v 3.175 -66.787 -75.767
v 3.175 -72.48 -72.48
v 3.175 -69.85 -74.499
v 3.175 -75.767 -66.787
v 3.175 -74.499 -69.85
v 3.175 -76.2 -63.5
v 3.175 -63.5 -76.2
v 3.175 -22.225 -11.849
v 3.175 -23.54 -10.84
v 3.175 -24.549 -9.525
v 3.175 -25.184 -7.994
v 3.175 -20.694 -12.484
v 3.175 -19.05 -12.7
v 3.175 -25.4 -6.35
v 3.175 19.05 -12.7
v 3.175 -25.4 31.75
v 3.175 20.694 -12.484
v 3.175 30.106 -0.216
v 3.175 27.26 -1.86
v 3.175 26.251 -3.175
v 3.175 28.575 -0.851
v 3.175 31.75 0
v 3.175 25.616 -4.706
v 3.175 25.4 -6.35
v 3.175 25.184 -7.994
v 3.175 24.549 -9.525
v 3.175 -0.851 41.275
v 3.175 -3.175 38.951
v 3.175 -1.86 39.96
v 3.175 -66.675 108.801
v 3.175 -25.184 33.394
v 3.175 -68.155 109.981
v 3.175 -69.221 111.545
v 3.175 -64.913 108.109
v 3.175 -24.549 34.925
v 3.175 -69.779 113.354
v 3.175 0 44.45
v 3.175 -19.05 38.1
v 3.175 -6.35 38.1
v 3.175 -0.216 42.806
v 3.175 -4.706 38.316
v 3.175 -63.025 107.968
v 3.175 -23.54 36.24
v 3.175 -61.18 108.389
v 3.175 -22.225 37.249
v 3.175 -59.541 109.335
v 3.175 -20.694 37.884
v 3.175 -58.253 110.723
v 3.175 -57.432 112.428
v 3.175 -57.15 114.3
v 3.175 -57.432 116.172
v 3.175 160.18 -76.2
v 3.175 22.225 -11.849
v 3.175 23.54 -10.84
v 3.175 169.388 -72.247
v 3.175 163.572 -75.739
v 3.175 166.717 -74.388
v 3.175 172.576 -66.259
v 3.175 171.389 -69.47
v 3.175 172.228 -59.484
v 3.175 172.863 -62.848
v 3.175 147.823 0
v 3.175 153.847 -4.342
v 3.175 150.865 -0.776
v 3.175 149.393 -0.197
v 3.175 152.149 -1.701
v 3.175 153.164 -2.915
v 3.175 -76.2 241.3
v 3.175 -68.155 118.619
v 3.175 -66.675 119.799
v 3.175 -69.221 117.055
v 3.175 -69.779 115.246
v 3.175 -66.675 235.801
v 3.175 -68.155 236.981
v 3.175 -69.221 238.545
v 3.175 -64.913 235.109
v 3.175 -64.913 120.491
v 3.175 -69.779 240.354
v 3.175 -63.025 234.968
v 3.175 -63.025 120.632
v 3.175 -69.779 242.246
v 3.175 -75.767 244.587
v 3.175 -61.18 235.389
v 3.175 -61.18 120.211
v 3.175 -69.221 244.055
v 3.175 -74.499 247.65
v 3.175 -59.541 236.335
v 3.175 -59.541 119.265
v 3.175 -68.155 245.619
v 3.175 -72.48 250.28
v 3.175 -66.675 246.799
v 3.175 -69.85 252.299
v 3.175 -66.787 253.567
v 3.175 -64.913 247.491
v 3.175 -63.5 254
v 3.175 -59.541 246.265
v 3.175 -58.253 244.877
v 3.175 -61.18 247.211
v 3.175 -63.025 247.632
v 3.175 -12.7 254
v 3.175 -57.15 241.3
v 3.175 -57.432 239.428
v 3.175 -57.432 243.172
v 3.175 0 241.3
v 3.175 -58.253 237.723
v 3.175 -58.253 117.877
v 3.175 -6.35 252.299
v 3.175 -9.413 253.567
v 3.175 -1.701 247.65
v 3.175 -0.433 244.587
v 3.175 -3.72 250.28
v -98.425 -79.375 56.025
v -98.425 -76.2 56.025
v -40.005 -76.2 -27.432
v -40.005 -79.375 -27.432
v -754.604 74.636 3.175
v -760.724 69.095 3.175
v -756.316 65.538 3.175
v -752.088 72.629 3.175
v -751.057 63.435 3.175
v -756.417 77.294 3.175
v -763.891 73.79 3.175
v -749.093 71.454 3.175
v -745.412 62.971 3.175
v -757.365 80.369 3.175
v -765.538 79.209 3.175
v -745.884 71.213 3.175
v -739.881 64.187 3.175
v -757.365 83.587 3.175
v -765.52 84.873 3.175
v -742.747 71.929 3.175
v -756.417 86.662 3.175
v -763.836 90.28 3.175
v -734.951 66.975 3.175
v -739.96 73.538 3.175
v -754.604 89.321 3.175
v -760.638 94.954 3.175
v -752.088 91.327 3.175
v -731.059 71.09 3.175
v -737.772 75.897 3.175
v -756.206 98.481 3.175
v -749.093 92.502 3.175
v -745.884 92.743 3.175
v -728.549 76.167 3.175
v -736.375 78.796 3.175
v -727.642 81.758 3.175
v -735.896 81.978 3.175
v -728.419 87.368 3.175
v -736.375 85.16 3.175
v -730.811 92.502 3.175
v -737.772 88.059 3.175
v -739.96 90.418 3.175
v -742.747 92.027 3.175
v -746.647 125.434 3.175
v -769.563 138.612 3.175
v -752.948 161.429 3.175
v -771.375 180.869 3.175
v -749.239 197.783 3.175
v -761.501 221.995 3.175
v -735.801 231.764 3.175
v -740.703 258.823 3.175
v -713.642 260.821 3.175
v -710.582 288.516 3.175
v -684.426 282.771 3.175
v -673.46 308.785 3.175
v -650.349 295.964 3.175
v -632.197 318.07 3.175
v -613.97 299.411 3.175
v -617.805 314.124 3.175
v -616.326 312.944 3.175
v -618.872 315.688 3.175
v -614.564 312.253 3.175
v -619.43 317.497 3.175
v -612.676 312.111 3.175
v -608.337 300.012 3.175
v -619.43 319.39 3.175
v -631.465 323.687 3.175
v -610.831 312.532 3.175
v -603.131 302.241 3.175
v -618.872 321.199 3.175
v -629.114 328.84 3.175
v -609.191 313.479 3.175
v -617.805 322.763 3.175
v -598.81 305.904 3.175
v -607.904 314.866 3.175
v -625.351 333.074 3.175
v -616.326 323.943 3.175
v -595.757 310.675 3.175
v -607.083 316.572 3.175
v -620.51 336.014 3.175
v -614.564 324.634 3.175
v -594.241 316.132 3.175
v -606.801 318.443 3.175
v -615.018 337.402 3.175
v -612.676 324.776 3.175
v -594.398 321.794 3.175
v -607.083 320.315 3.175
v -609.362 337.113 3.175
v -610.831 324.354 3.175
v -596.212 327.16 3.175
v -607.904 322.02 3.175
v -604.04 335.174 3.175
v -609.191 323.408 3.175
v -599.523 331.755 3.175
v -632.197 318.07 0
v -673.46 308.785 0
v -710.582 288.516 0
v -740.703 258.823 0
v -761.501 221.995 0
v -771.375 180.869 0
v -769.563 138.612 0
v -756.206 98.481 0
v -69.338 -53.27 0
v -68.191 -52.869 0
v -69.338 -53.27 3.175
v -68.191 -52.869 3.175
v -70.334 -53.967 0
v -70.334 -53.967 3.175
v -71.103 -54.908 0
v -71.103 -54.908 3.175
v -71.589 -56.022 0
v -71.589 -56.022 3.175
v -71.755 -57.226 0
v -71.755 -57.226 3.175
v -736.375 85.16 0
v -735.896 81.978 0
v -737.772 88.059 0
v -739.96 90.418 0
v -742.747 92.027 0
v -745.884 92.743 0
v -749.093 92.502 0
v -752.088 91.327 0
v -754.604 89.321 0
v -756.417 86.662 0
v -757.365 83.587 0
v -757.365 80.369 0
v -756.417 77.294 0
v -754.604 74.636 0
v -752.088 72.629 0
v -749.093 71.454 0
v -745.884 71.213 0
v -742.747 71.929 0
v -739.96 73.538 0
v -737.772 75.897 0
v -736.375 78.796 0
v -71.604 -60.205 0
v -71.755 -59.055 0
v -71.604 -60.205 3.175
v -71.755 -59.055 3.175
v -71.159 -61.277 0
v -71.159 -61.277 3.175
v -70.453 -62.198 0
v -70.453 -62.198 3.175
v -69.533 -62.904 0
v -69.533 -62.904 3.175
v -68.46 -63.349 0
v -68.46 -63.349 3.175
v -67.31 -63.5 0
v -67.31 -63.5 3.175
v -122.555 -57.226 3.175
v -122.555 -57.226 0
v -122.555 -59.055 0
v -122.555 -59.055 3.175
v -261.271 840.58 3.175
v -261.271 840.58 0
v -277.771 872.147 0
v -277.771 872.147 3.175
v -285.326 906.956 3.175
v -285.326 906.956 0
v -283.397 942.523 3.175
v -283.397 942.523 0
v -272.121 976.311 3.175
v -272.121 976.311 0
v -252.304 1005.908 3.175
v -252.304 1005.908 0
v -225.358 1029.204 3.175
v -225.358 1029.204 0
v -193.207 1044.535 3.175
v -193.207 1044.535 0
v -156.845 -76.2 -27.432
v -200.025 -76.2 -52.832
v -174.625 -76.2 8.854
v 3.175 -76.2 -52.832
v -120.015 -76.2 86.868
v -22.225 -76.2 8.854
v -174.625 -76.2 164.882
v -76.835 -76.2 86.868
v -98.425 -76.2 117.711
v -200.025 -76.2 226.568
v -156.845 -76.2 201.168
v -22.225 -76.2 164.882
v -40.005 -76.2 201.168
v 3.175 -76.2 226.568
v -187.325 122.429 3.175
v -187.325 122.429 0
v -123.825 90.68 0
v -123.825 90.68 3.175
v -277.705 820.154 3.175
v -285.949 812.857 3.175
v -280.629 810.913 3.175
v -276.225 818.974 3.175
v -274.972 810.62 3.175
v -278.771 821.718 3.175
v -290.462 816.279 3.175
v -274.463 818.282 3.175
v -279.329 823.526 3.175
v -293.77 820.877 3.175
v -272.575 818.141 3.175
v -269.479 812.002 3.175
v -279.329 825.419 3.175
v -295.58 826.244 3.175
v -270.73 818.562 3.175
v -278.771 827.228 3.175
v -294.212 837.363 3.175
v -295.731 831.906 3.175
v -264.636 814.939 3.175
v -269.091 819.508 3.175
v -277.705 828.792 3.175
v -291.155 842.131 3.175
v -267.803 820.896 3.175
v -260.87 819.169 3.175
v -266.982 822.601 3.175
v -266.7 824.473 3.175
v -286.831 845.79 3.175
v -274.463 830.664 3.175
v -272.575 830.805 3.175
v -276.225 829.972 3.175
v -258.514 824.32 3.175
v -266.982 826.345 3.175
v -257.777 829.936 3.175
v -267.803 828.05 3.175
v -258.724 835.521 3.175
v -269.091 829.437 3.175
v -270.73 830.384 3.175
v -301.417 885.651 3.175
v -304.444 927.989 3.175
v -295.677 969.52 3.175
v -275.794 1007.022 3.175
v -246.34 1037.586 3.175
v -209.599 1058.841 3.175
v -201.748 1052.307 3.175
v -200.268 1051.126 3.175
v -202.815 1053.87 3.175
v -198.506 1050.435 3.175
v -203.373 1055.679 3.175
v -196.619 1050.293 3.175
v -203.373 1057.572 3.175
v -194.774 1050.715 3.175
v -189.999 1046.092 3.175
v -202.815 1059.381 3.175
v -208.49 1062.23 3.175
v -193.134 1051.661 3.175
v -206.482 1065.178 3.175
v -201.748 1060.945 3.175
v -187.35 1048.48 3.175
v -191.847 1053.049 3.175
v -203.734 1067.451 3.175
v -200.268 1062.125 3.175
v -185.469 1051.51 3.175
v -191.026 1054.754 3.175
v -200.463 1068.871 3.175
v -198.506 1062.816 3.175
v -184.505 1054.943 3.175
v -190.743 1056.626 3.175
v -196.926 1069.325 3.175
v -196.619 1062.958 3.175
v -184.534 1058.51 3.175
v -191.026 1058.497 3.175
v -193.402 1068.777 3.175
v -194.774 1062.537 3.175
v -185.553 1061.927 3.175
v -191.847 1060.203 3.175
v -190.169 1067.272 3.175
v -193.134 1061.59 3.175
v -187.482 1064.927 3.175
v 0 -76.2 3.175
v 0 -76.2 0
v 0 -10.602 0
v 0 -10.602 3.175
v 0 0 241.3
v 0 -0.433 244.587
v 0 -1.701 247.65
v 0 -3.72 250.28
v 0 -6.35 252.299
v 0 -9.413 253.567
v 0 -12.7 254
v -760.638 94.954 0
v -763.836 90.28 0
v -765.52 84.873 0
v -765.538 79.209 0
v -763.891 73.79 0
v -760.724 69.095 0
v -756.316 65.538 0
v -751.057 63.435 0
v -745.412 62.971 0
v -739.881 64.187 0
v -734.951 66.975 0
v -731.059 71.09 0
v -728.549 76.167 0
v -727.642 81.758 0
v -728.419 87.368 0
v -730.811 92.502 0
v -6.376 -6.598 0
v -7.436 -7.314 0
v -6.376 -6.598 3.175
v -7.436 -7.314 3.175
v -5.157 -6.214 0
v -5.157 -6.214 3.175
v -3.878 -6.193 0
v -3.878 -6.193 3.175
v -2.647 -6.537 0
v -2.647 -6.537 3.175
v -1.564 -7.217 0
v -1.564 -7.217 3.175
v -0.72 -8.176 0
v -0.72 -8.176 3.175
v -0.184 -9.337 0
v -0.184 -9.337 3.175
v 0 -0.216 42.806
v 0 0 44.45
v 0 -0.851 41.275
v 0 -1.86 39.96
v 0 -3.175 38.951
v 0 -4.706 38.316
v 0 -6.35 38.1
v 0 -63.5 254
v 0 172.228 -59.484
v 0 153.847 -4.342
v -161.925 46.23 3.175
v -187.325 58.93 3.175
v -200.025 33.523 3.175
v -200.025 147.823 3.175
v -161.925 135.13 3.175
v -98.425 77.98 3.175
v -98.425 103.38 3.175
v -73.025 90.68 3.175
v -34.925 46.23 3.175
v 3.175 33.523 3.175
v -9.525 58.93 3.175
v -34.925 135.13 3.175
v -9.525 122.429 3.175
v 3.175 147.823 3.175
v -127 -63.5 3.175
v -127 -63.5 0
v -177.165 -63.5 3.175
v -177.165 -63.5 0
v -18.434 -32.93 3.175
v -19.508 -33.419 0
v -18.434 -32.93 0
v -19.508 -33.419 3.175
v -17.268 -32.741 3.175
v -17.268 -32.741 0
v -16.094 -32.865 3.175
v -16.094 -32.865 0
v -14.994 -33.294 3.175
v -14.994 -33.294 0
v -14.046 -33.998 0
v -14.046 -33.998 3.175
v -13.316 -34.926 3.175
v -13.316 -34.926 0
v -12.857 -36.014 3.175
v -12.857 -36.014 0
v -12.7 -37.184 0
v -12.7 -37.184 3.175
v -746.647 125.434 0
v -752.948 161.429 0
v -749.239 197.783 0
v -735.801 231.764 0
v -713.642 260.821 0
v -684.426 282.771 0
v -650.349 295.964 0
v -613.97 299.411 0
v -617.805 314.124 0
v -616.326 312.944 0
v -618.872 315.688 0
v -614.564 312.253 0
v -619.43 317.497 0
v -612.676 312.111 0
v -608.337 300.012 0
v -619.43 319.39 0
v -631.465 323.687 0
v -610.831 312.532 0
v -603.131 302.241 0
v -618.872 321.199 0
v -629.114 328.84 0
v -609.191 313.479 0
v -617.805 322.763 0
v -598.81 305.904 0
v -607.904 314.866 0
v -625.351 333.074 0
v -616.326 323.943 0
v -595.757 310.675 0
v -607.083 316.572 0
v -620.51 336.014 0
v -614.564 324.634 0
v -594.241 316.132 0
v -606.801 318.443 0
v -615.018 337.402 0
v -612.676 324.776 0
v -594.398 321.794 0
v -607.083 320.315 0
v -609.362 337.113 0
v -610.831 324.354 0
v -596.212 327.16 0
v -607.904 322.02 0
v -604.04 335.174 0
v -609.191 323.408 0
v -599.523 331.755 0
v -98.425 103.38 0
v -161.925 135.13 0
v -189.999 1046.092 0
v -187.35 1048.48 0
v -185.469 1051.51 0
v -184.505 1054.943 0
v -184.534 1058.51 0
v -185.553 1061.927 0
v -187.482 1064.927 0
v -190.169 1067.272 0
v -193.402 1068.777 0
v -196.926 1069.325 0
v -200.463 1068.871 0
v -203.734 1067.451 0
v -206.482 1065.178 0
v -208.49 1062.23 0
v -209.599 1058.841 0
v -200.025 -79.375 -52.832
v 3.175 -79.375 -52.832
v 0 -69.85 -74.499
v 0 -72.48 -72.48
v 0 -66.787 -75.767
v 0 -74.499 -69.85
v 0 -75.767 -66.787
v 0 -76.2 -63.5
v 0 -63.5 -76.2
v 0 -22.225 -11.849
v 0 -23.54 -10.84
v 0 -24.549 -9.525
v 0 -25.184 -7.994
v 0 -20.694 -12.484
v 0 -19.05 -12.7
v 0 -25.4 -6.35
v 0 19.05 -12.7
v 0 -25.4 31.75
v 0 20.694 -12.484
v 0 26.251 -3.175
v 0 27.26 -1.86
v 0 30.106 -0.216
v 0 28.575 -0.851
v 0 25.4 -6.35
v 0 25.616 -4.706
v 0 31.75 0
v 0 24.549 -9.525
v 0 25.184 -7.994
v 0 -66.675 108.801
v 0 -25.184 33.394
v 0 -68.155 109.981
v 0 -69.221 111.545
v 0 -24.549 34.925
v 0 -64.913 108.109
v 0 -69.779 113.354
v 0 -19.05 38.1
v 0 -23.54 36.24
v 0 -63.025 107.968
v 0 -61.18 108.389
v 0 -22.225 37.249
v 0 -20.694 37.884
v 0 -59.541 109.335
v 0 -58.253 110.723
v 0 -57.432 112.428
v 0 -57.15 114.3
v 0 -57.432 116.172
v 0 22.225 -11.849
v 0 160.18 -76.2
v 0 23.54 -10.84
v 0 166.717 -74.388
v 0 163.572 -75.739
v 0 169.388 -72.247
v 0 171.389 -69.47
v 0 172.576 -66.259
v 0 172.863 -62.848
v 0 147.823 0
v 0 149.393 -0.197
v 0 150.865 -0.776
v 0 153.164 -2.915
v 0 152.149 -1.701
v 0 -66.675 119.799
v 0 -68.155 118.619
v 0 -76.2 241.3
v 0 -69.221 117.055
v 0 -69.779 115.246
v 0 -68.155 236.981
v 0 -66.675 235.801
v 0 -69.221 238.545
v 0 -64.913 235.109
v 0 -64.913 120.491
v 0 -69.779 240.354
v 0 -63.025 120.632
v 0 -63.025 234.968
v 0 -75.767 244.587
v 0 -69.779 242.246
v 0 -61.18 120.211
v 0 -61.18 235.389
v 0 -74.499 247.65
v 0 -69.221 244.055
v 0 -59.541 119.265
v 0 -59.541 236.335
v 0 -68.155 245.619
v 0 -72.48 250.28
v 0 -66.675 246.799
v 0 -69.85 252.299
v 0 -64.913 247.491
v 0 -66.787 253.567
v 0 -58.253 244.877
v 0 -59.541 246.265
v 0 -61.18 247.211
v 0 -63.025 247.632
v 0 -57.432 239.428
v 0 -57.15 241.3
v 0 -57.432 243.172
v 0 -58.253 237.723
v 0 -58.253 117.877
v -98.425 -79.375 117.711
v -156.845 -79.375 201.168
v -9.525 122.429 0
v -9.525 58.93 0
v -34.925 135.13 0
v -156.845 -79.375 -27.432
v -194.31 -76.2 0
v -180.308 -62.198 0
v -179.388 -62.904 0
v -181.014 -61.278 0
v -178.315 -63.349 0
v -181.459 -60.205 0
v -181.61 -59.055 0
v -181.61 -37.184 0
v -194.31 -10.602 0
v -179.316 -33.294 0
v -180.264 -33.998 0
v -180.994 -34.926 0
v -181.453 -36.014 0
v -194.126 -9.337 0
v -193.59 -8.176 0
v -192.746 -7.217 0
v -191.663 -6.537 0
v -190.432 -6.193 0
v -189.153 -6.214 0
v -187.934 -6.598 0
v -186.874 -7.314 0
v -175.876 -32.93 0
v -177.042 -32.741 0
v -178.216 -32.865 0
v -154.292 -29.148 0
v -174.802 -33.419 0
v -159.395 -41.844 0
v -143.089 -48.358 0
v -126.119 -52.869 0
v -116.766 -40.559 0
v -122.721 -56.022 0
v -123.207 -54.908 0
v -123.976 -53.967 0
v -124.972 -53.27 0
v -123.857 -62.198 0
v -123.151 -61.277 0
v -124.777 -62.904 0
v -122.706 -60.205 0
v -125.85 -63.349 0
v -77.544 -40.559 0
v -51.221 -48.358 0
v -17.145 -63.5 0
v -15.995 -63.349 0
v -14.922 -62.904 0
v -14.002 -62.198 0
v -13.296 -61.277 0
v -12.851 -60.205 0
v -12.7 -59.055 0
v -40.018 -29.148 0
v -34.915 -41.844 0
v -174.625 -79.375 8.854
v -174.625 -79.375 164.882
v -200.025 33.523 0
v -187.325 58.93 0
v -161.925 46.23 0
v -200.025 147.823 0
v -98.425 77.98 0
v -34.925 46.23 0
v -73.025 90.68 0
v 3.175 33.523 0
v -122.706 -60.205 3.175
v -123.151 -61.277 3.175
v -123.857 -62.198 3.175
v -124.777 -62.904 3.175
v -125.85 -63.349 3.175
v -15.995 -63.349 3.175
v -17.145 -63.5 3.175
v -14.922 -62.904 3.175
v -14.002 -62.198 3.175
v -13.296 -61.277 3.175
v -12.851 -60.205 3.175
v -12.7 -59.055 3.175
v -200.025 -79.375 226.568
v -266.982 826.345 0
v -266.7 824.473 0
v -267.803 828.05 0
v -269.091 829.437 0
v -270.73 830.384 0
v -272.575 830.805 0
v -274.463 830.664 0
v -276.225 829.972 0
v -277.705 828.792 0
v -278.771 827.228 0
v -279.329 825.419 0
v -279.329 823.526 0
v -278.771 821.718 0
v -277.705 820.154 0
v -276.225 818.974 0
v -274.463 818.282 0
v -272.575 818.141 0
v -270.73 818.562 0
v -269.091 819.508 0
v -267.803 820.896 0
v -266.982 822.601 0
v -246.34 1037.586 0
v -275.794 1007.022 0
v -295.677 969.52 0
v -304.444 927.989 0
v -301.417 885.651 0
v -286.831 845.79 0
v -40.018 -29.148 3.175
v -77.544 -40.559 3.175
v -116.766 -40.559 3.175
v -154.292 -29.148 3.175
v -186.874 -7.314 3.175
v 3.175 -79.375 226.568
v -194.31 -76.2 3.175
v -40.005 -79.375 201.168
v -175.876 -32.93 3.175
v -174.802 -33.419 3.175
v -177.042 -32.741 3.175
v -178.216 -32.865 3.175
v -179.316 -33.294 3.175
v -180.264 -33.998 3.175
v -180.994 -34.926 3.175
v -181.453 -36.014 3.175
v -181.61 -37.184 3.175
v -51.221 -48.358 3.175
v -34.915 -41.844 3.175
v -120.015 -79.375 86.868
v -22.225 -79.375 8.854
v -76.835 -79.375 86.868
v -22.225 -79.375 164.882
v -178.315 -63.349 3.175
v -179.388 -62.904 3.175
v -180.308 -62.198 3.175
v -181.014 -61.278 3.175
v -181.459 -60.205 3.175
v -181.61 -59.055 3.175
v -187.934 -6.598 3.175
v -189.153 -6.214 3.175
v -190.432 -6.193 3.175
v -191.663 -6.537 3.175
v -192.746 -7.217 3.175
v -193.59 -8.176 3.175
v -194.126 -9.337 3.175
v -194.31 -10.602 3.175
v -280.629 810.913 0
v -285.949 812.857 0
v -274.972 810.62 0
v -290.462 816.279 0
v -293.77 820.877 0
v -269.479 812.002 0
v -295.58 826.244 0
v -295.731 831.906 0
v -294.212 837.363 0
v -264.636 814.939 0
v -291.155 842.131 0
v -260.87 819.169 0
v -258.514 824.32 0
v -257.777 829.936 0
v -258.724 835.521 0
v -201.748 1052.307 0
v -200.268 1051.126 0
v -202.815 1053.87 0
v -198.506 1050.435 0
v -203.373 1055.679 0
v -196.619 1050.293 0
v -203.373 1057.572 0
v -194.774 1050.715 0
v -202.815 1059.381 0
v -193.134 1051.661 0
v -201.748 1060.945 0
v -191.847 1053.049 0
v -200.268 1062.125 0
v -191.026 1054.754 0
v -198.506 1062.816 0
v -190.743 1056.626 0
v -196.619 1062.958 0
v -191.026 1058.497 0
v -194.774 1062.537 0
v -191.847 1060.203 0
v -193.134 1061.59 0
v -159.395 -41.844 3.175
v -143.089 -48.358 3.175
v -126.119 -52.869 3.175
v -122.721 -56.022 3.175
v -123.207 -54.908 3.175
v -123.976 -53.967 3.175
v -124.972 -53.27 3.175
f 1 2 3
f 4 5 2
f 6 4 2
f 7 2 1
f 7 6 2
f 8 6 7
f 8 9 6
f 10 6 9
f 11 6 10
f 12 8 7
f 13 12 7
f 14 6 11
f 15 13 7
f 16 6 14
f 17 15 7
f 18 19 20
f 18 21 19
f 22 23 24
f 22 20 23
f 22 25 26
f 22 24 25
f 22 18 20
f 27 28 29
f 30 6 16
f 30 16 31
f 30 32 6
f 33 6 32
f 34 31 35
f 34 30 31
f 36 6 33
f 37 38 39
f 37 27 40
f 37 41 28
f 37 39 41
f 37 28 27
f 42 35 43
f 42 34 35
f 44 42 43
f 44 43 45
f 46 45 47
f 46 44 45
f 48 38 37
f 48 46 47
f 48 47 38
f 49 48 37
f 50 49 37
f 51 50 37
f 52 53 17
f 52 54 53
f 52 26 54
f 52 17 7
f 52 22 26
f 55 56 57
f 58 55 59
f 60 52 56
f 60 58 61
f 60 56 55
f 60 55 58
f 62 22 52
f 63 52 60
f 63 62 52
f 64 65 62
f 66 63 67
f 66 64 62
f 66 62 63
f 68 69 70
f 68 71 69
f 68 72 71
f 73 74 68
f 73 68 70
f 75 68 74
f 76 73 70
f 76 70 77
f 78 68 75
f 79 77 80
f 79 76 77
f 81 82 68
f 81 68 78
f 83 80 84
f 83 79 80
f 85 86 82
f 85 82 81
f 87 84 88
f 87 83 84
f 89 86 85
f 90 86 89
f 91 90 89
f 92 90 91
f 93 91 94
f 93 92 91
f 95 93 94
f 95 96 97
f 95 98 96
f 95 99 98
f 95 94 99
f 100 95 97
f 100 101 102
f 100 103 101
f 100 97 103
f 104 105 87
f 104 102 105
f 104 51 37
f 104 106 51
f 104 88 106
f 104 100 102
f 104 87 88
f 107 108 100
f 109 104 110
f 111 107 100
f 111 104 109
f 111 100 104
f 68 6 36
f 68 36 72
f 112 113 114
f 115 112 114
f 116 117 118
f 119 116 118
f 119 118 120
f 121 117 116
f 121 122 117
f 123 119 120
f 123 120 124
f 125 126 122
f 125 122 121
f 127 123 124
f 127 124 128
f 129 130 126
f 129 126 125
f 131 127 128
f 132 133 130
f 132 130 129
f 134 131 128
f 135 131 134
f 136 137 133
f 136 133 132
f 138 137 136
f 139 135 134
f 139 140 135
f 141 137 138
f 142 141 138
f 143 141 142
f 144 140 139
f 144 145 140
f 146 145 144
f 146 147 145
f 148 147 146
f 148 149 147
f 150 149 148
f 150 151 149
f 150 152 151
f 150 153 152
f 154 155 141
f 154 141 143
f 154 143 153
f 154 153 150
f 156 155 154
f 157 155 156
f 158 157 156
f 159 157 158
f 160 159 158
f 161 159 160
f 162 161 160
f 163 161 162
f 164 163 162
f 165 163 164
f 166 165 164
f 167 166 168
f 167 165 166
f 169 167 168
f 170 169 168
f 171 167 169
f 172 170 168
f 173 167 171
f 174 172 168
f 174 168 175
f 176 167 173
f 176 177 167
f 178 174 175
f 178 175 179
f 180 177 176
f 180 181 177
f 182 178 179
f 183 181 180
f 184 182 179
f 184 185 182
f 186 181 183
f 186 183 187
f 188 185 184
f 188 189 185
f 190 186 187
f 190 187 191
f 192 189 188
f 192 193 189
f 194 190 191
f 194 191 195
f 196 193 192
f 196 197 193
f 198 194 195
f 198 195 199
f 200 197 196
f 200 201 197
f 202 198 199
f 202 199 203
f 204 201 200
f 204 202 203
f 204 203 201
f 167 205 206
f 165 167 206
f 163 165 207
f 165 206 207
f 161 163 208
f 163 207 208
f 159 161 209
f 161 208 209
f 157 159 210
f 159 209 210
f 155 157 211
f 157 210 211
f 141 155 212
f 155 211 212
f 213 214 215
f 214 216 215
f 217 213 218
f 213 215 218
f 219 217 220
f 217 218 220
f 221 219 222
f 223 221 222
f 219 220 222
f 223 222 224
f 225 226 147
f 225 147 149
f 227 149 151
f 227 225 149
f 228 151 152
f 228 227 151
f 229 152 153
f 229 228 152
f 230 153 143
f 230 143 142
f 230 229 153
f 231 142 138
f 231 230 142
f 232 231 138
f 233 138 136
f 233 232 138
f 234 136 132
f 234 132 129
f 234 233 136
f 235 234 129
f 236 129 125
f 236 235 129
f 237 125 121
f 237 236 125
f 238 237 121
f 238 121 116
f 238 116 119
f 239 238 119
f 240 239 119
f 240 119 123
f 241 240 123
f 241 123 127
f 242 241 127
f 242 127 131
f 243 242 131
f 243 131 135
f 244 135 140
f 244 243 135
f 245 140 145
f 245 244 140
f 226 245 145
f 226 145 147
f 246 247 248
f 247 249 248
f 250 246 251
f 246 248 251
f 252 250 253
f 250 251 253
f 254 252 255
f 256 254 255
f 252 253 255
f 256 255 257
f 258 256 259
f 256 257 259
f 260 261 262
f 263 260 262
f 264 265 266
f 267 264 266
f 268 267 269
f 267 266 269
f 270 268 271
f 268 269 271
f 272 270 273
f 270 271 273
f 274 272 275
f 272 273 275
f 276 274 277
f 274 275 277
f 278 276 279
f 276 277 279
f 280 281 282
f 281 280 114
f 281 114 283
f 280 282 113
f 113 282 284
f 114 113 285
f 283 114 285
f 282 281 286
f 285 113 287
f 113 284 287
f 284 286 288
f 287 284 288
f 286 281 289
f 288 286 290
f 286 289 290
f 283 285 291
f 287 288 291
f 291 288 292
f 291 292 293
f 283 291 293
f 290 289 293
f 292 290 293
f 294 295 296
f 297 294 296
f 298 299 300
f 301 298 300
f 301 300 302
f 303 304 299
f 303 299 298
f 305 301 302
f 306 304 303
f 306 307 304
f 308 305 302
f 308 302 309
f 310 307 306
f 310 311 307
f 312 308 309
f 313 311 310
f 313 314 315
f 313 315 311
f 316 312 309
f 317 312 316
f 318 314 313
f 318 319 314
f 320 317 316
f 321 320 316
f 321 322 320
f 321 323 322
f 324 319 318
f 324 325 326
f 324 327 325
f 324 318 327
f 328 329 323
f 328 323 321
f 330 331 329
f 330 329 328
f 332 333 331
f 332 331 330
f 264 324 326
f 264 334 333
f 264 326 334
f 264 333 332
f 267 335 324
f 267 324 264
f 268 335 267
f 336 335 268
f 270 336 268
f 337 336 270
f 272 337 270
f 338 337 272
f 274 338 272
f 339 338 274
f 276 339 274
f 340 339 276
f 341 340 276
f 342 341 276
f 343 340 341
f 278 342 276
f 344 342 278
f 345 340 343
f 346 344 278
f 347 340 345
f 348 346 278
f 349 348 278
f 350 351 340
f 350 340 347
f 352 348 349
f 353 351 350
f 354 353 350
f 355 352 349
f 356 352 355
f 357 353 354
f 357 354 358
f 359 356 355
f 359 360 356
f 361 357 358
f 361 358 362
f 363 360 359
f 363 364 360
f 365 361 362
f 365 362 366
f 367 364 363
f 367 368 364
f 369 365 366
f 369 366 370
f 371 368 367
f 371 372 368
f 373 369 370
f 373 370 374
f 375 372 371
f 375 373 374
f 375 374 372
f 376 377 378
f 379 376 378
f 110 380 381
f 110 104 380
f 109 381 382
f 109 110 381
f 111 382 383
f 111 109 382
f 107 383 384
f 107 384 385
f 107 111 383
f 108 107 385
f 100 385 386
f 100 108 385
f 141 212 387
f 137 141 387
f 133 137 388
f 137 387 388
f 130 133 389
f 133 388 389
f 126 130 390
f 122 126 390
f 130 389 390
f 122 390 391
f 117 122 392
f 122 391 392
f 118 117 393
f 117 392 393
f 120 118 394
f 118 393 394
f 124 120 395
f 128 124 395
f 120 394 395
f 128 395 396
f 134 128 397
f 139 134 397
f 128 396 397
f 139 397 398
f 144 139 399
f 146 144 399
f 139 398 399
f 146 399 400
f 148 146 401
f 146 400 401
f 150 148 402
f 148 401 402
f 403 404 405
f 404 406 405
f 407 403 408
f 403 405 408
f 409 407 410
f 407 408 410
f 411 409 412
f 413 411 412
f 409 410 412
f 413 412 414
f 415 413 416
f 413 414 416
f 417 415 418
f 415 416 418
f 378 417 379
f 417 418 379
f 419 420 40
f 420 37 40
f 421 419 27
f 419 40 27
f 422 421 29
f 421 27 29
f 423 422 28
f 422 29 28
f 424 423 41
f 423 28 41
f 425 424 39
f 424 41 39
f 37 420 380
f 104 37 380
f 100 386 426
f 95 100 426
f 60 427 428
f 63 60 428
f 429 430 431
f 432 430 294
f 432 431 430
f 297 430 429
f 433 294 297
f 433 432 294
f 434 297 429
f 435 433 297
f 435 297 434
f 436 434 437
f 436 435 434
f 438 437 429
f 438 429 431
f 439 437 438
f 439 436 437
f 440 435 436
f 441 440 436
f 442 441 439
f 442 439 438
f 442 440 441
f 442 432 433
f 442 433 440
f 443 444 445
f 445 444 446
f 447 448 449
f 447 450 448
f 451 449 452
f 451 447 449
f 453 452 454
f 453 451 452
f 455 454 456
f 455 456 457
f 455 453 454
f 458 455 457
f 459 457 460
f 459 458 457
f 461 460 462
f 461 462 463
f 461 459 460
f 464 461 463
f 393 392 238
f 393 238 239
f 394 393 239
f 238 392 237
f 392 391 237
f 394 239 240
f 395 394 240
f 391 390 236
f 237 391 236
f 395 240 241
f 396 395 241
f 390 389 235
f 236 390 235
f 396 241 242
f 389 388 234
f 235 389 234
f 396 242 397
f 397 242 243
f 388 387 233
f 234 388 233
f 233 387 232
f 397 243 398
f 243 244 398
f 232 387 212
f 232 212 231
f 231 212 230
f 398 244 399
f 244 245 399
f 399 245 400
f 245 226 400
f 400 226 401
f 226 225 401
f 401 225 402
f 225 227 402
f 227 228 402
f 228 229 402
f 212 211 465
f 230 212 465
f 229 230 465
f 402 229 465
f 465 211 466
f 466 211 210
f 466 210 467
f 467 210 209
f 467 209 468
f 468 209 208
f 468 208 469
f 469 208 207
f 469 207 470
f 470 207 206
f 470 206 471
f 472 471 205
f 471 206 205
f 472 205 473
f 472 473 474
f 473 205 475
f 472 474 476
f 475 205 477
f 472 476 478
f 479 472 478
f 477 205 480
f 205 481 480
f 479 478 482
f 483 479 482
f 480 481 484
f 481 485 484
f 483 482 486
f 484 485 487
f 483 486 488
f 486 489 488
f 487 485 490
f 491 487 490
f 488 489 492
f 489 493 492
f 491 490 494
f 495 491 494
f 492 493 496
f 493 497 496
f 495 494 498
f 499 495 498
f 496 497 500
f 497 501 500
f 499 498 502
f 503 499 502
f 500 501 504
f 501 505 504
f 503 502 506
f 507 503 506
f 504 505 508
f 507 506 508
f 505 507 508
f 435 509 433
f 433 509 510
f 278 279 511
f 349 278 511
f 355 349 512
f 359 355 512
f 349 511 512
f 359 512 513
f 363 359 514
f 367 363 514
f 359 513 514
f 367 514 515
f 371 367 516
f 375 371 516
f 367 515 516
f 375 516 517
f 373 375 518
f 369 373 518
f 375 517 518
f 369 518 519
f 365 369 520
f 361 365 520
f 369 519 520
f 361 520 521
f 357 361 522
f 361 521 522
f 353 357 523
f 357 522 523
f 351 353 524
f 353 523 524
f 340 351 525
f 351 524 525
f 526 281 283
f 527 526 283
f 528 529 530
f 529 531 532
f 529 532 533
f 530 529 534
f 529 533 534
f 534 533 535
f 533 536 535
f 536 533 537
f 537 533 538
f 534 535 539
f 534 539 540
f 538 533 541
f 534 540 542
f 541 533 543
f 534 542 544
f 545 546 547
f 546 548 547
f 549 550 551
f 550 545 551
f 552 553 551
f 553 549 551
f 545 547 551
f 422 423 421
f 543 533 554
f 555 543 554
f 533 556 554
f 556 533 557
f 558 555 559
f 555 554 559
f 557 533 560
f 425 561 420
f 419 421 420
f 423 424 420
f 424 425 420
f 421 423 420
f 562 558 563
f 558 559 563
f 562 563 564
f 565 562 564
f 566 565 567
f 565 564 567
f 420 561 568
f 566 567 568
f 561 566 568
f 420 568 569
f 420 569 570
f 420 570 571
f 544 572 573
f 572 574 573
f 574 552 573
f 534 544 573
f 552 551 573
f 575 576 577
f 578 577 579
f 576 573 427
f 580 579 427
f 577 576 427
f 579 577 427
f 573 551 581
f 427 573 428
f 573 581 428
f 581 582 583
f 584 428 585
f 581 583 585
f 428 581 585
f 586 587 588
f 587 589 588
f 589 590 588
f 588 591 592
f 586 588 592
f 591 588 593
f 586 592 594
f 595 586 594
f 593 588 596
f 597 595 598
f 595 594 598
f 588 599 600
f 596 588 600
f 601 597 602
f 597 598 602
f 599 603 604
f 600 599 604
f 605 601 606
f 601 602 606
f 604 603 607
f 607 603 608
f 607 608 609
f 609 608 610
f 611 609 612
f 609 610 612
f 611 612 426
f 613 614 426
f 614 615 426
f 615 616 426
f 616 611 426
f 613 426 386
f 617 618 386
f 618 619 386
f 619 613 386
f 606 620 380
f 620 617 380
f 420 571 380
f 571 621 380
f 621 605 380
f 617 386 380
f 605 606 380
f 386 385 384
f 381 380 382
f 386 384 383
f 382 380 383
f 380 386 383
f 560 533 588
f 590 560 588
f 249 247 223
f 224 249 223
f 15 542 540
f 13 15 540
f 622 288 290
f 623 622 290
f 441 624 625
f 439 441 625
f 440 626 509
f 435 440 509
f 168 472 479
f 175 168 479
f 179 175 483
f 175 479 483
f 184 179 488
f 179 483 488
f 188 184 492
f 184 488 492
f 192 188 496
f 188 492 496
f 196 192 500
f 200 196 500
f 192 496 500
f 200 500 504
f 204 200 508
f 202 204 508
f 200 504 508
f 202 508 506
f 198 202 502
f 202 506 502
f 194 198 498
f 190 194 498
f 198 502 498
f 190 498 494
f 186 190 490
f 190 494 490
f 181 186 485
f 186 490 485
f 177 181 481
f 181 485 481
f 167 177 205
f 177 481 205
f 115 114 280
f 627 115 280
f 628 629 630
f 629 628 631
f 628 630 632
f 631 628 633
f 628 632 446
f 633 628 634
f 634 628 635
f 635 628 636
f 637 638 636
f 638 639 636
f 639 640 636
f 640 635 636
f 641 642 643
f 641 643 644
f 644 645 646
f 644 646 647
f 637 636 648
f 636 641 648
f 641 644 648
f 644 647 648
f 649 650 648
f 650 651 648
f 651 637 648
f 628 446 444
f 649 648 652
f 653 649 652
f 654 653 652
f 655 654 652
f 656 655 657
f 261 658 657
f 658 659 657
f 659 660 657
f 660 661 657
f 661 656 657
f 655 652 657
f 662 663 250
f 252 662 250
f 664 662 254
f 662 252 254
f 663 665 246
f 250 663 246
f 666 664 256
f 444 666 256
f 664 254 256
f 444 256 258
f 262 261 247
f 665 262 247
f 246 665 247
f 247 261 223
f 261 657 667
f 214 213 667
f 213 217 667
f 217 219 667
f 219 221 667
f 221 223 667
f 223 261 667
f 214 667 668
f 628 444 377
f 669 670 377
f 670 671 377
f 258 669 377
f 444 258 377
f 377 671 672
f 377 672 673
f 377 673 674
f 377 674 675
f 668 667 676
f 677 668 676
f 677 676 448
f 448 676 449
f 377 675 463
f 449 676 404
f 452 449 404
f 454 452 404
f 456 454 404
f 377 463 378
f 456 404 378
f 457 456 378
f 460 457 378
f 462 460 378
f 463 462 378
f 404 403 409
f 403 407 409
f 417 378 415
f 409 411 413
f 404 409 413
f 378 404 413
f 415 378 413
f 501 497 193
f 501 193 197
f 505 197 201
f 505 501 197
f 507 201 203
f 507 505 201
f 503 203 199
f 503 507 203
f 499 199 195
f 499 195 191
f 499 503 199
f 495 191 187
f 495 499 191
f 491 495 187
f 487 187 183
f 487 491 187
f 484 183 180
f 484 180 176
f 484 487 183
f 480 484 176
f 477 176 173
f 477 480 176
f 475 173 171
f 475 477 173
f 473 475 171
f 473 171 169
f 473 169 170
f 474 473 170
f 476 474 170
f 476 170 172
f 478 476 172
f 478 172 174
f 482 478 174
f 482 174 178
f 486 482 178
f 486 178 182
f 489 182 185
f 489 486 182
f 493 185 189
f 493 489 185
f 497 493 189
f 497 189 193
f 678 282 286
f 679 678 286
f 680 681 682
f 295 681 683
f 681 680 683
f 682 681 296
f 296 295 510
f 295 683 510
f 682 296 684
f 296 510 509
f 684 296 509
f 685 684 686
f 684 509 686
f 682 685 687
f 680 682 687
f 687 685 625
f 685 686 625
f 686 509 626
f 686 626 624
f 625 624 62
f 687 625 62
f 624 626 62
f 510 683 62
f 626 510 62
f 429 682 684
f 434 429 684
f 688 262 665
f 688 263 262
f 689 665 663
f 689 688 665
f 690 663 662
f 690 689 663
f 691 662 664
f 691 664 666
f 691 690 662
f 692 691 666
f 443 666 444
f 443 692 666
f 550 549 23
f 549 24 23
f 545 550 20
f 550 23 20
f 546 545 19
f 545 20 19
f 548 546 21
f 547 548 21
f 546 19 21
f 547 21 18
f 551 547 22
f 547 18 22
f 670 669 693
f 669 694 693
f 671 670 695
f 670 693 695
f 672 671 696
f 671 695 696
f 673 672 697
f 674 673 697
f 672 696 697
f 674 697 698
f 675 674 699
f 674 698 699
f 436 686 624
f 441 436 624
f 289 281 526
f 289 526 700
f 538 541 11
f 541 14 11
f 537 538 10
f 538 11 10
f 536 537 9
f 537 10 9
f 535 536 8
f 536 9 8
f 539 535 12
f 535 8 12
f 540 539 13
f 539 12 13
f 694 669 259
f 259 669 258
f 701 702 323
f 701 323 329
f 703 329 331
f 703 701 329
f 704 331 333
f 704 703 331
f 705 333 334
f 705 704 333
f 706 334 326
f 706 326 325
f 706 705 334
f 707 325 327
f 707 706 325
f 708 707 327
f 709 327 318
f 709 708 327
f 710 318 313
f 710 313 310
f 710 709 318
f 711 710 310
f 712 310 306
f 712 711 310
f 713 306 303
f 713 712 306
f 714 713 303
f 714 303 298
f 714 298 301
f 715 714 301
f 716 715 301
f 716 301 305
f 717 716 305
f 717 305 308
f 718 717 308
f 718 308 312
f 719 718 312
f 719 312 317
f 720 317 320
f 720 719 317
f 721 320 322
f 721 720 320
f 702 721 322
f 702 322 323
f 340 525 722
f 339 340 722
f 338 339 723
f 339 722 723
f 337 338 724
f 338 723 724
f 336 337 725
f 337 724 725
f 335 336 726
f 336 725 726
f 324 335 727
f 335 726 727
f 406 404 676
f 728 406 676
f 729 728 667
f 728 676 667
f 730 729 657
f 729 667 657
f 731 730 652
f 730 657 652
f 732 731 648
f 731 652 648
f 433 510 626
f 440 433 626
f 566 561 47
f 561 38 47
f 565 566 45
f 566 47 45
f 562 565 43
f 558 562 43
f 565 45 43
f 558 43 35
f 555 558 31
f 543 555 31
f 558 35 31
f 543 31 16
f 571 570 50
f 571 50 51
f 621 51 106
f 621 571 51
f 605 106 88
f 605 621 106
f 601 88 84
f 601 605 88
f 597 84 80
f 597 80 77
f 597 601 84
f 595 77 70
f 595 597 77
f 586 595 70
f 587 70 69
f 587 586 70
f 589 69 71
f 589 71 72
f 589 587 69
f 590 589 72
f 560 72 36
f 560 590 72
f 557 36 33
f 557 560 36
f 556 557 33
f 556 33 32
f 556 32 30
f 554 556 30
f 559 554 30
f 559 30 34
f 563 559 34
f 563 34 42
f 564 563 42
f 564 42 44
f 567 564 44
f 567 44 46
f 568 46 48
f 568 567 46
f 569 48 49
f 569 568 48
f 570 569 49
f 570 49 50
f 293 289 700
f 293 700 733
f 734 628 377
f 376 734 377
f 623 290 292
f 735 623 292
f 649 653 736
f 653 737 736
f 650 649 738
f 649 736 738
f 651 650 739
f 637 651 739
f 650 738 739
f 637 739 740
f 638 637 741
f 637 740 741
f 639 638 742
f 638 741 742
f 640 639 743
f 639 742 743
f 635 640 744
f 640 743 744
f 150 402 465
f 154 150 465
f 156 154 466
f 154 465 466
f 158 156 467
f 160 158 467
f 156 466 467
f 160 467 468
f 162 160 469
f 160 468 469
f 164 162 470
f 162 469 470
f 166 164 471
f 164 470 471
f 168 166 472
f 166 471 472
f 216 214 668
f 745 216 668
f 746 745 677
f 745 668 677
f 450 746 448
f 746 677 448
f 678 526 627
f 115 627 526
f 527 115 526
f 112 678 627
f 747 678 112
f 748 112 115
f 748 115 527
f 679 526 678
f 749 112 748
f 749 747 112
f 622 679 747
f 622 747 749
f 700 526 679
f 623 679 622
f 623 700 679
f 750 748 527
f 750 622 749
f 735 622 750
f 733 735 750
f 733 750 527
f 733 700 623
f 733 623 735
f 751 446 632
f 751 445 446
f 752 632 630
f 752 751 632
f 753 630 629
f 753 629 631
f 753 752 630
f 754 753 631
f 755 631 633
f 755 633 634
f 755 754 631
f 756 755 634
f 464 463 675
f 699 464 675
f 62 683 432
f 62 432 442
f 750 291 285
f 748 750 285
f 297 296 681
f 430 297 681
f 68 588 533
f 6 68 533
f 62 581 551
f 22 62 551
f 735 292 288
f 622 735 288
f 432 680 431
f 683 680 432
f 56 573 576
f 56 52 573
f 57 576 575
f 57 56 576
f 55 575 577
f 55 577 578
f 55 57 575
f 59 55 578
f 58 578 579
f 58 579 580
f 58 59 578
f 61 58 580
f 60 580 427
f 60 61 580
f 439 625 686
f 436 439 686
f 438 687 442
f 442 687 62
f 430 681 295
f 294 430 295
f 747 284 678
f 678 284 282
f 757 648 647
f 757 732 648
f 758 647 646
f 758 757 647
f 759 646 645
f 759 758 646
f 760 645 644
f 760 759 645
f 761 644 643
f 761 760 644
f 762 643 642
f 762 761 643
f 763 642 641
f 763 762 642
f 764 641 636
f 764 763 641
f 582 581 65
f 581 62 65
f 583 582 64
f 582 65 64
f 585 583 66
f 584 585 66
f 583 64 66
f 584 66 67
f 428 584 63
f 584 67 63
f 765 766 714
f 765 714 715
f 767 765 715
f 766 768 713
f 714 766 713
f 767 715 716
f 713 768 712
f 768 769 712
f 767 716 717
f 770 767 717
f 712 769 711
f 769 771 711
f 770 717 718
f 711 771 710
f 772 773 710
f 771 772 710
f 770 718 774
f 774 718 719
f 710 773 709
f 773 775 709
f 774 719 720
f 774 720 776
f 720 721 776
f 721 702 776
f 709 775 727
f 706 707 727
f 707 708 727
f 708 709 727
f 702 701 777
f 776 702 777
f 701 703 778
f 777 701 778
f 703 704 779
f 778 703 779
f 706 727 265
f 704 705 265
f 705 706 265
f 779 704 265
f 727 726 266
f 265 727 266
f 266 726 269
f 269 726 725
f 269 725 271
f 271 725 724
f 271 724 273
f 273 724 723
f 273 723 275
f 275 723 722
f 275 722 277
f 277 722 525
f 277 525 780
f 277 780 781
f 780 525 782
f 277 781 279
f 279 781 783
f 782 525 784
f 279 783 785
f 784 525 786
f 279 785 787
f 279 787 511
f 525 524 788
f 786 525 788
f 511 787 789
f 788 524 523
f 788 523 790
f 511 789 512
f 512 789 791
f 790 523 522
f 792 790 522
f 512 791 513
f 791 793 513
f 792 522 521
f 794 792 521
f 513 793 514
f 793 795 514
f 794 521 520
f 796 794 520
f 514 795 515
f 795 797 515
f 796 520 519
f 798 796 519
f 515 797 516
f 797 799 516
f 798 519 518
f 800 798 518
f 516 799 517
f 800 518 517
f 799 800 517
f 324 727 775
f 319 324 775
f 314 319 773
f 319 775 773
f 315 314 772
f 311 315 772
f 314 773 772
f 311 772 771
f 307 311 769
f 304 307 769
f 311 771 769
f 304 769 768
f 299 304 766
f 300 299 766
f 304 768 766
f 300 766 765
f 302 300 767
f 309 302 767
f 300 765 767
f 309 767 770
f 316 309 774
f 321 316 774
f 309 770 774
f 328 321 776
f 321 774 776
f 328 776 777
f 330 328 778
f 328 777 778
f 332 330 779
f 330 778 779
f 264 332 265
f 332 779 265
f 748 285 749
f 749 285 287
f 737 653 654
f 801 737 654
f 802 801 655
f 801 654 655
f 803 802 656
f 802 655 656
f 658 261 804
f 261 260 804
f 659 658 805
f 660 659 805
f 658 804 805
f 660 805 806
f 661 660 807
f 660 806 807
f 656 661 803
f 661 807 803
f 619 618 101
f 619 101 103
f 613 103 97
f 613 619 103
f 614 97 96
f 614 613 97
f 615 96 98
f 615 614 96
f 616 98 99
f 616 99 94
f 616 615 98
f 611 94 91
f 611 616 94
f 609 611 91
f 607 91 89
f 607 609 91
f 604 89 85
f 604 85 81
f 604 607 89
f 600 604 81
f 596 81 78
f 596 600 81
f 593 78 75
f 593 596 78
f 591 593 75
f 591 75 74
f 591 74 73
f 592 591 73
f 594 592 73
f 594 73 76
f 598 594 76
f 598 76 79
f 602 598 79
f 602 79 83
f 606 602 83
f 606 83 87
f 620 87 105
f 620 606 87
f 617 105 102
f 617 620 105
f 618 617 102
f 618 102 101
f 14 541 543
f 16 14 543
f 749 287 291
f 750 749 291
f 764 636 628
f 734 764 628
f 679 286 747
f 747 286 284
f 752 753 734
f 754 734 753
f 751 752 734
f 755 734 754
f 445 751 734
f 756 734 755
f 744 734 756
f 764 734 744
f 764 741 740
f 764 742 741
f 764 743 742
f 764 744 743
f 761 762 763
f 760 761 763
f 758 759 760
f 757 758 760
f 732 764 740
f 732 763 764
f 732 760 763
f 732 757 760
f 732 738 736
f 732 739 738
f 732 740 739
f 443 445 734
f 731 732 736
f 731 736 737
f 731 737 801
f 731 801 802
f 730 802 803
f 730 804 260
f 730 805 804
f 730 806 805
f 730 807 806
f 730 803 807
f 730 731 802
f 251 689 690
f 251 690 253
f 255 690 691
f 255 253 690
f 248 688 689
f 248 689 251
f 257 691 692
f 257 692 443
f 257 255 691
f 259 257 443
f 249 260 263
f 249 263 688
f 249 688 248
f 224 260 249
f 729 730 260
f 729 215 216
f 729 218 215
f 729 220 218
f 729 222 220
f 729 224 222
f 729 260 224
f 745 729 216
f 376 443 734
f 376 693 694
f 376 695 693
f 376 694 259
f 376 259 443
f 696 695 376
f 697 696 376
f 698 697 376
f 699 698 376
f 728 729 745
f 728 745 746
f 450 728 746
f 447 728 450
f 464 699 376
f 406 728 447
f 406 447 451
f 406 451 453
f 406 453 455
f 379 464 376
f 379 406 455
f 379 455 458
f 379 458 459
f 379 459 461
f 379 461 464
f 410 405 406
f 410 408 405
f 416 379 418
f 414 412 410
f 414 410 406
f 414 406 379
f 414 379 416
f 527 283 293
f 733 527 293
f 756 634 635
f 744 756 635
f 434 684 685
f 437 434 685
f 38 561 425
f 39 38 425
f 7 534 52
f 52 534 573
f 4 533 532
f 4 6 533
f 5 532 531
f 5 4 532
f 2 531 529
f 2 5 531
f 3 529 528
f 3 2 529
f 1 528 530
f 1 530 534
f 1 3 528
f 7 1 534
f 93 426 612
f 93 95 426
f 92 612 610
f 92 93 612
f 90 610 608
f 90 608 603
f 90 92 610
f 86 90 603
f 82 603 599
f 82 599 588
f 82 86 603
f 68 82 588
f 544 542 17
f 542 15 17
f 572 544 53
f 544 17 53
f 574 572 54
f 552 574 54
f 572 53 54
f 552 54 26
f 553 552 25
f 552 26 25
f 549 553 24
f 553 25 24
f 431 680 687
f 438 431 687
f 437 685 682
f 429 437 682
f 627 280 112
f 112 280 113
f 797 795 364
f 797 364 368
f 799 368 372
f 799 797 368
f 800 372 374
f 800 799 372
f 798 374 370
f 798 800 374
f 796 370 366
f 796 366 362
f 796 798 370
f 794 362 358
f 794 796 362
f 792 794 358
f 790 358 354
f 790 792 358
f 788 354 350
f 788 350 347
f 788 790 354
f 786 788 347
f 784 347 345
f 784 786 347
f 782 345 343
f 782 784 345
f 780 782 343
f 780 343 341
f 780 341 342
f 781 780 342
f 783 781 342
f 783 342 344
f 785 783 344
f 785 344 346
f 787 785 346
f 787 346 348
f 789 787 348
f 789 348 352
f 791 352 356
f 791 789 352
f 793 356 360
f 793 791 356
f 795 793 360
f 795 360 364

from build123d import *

# Parameters (mm, degrees)
F0_R      = 6.35
F1_DEPTH  = 3.175
F2_R      = 12.7
F3_R      = 6.34999
F4_W      = 203.2
F4_H      = 114.3
F5_DEPTH  = 3.175
F6_W      = 203.2
F6_H      = 279.4
F7_DEPTH  = 3.175
F10_DEPTH = 3.175
F11_R     = 4.445
F12_R     = 12.7
F13_R     = 10.795
F13_R_2   = 6.35
F14_DEPTH = 3.175
F15_R     = 6.35
F16_DEPTH = 3.175


# Not quite as in the source:
# - a fillet or chamfer is up to 0.001 mm smaller than in the source, because OpenCascade refuses the exact size


with BuildPart() as f1:
    # F0 (on Right) → F1 (new body)
    with BuildSketch(Plane.YZ):
        Polygon((25.4, -12.7), (0, -12.7), (-25.4, -12.7), (-25.4, 38.1), (0, 38.1), (0, 254), (-76.2, 254), (-76.2, -76.2), (177.8, -76.2), (152.4, 0), (25.4, 0), align=None)
        with Locations((-63.5, 114.3)):
            Circle(F0_R, mode=Mode.SUBTRACT)
        with Locations((-63.5, 241.3)):
            Circle(F0_R, mode=Mode.SUBTRACT)
    extrude(amount=F1_DEPTH)

    # F2
    f2_edges = [f1.edges().sort_by_distance(p)[0] for p in [
        (1.5875, -76.2, 254),
        (1.5875, 0, 254),
    ]]
    fillet(f2_edges, radius=F2_R)

    # F3 (radius 6.35 in the source; OpenCascade refuses exactly that, so slightly less here)
    f3_edges = [f1.edges().sort_by_distance(p)[0] for p in [
        (1.5875, 152.4, 0),
        (1.5875, 25.4, 0),
        (1.5875, 25.4, -12.7),
        (1.5875, -25.4, 38.1),
        (1.5875, 0, 38.1),
        (1.5875, -25.4, -12.7),
    ]]
    fillet(f3_edges, radius=F3_R)

    # F12
    f12_edges = [f1.edges().sort_by_distance(p)[0] for p in [
        (1.5875, -76.2, -76.2),
        (1.5875, 177.8, -76.2),
    ]]
    fillet(f12_edges, radius=F12_R)


with BuildPart() as f5:
    # F4 (on face) → F5 (new body)
    with BuildSketch(Plane.XY):
        with Locations((-98.425, 90.6731789526)):
            Rectangle(F4_W, F4_H)
        Polygon((-34.925, 46.2296610243), (-161.925, 46.2296610243), (-98.425, 77.9795901259), align=None, mode=Mode.SUBTRACT)
        Polygon((-187.325, 58.9296610243), (-187.325, 122.4294908681), (-123.8250283594, 90.6795759462), align=None, mode=Mode.SUBTRACT)
        Polygon((-73.0249716406, 90.6795759462), (-9.525, 122.4294908681), (-9.525, 58.9296610243), align=None, mode=Mode.SUBTRACT)
        Polygon((-98.425, 103.3795617665), (-161.9253403131, 135.1296610243), (-34.9246596869, 135.1296610243), align=None, mode=Mode.SUBTRACT)
    extrude(amount=F5_DEPTH)


with BuildPart() as f7:
    # F6 (on face) → F7 (new body)
    with BuildSketch(Plane.XZ.offset(76.2)):
        with Locations((-98.425, 101.6)):
            Rectangle(F6_W, F6_H)
        Polygon((-98.425, 70.7571428571), (-40.005, -12.7), (-156.845, -12.7), align=None, mode=Mode.SUBTRACT)
        Polygon((-76.835, 101.6), (-22.225, 179.6142857143), (-22.225, 23.5857142857), align=None, mode=Mode.SUBTRACT)
        Polygon((-174.625, 23.5857142857), (-174.625, 179.6142857143), (-120.015, 101.6), align=None, mode=Mode.SUBTRACT)
        Polygon((-98.425, 132.4428571429), (-156.845, 215.9), (-40.005, 215.9), align=None, mode=Mode.SUBTRACT)
    extrude(amount=F7_DEPTH)


with BuildPart() as f7_1:
    # F8: moved
    add(f7.part.moved(Location((0, 0, -14.732))))


with BuildPart() as f10:
    # F9 (on Top) → F10 (new body)
    with BuildSketch(Plane.XY):
        with BuildLine():
            ThreePointArc((0, 0), (-97.155, -42.0092726381), (-194.31, 0))
            Line((-194.31, 0), (-194.31, -76.2))
            Line((-194.31, -76.2), (0, -76.2))
            Line((0, -76.2), (0, 0))
        make_face()
        with BuildLine():
            Line((-122.555, -63.5), (-181.61, -63.5))
            Line((-181.61, -63.5), (-181.61, -28.874717996))
            ThreePointArc((-181.61, -28.874717996), (-153.4504018439, -44.4838948062), (-122.555, -53.5438900549))
            Line((-122.555, -53.5438900549), (-122.555, -63.5))
        make_face(mode=Mode.SUBTRACT)
        with BuildLine():
            Line((-12.7, -28.874717996), (-12.7, -63.5))
            Line((-12.7, -63.5), (-71.755, -63.5))
            Line((-71.755, -63.5), (-71.755, -53.5438900549))
            ThreePointArc((-71.755, -53.5438900549), (-40.8595981561, -44.4838948062), (-12.7, -28.874717996))
        make_face(mode=Mode.SUBTRACT)
    extrude(amount=F10_DEPTH)

    # F11
    f11_edges = [f10.edges().sort_by_distance(p)[0] for p in [
        (-122.555, -63.5, 1.5875),
        (-122.555, -53.54389, 1.5875),
        (-181.61, -63.5, 1.5875),
        (-181.61, -28.874718, 1.5875),
        (-12.7, -63.5, 1.5875),
        (-71.755, -63.5, 1.5875),
        (-71.755, -53.54389, 1.5875),
        (-12.7, -28.874718, 1.5875),
        (-194.31, 0, 1.5875),
        (0, 0, 1.5875),
    ]]
    fillet(f11_edges, radius=F11_R)


with BuildPart() as f14:
    # F13 (on Top) → F14 (new body)
    with BuildSketch(Plane.XY):
        with BuildLine():
            ThreePointArc((-632.1968888271, 318.0701347804), (-752.3858015786, 241.1343877568), (-756.2063521379, 98.4813565521))
            ThreePointArc((-756.2063521379, 98.4813565521), (-751.0570291306, 63.4352752545), (-730.811212931, 92.5015833821))
            ThreePointArc((-730.811212931, 92.5015833821), (-735.8008176206, 231.7641386358), (-613.9695684644, 299.4110319849))
            ThreePointArc((-613.9695684644, 299.4110319849), (-599.523415155, 331.7552091602), (-632.1968888271, 318.0701347804))
        make_face()
        with Locations((-746.6907536235, 81.9781482303)):
            Circle(F13_R, mode=Mode.SUBTRACT)
        with Locations((-613.1505463981, 318.4434176172)):
            Circle(F13_R_2, mode=Mode.SUBTRACT)
    extrude(amount=F14_DEPTH)


with BuildPart() as f16:
    # F15 (on Top) → F16 (new body)
    with BuildSketch(Plane.XY):
        with BuildLine():
            ThreePointArc((-261.2709873869, 840.5799733082), (-278.8922283797, 959.7951557271), (-193.2070800325, 1044.5348937844))
            ThreePointArc((-193.2070800325, 1044.5348937844), (-188.7425781177, 1066.1939476514), (-209.5987572531, 1058.8409765764))
            ThreePointArc((-209.5987572532, 1058.8409765764), (-295.6765455954, 969.5204824254), (-286.8307241935, 845.7897757879))
            ThreePointArc((-286.8307241935, 845.7897757879), (-280.6286867095, 810.9134731448), (-261.2709873869, 840.5799733082))
        make_face()
        with Locations((-273.0500046197, 824.472849402)):
            Circle(F15_R, mode=Mode.SUBTRACT)
        with Locations((-197.0934681671, 1056.6256335165)):
            Circle(F15_R, mode=Mode.SUBTRACT)
    extrude(amount=F16_DEPTH)


solid = Compound([f1.part, f5.part, f7_1.part, f10.part, f14.part, f16.part])
